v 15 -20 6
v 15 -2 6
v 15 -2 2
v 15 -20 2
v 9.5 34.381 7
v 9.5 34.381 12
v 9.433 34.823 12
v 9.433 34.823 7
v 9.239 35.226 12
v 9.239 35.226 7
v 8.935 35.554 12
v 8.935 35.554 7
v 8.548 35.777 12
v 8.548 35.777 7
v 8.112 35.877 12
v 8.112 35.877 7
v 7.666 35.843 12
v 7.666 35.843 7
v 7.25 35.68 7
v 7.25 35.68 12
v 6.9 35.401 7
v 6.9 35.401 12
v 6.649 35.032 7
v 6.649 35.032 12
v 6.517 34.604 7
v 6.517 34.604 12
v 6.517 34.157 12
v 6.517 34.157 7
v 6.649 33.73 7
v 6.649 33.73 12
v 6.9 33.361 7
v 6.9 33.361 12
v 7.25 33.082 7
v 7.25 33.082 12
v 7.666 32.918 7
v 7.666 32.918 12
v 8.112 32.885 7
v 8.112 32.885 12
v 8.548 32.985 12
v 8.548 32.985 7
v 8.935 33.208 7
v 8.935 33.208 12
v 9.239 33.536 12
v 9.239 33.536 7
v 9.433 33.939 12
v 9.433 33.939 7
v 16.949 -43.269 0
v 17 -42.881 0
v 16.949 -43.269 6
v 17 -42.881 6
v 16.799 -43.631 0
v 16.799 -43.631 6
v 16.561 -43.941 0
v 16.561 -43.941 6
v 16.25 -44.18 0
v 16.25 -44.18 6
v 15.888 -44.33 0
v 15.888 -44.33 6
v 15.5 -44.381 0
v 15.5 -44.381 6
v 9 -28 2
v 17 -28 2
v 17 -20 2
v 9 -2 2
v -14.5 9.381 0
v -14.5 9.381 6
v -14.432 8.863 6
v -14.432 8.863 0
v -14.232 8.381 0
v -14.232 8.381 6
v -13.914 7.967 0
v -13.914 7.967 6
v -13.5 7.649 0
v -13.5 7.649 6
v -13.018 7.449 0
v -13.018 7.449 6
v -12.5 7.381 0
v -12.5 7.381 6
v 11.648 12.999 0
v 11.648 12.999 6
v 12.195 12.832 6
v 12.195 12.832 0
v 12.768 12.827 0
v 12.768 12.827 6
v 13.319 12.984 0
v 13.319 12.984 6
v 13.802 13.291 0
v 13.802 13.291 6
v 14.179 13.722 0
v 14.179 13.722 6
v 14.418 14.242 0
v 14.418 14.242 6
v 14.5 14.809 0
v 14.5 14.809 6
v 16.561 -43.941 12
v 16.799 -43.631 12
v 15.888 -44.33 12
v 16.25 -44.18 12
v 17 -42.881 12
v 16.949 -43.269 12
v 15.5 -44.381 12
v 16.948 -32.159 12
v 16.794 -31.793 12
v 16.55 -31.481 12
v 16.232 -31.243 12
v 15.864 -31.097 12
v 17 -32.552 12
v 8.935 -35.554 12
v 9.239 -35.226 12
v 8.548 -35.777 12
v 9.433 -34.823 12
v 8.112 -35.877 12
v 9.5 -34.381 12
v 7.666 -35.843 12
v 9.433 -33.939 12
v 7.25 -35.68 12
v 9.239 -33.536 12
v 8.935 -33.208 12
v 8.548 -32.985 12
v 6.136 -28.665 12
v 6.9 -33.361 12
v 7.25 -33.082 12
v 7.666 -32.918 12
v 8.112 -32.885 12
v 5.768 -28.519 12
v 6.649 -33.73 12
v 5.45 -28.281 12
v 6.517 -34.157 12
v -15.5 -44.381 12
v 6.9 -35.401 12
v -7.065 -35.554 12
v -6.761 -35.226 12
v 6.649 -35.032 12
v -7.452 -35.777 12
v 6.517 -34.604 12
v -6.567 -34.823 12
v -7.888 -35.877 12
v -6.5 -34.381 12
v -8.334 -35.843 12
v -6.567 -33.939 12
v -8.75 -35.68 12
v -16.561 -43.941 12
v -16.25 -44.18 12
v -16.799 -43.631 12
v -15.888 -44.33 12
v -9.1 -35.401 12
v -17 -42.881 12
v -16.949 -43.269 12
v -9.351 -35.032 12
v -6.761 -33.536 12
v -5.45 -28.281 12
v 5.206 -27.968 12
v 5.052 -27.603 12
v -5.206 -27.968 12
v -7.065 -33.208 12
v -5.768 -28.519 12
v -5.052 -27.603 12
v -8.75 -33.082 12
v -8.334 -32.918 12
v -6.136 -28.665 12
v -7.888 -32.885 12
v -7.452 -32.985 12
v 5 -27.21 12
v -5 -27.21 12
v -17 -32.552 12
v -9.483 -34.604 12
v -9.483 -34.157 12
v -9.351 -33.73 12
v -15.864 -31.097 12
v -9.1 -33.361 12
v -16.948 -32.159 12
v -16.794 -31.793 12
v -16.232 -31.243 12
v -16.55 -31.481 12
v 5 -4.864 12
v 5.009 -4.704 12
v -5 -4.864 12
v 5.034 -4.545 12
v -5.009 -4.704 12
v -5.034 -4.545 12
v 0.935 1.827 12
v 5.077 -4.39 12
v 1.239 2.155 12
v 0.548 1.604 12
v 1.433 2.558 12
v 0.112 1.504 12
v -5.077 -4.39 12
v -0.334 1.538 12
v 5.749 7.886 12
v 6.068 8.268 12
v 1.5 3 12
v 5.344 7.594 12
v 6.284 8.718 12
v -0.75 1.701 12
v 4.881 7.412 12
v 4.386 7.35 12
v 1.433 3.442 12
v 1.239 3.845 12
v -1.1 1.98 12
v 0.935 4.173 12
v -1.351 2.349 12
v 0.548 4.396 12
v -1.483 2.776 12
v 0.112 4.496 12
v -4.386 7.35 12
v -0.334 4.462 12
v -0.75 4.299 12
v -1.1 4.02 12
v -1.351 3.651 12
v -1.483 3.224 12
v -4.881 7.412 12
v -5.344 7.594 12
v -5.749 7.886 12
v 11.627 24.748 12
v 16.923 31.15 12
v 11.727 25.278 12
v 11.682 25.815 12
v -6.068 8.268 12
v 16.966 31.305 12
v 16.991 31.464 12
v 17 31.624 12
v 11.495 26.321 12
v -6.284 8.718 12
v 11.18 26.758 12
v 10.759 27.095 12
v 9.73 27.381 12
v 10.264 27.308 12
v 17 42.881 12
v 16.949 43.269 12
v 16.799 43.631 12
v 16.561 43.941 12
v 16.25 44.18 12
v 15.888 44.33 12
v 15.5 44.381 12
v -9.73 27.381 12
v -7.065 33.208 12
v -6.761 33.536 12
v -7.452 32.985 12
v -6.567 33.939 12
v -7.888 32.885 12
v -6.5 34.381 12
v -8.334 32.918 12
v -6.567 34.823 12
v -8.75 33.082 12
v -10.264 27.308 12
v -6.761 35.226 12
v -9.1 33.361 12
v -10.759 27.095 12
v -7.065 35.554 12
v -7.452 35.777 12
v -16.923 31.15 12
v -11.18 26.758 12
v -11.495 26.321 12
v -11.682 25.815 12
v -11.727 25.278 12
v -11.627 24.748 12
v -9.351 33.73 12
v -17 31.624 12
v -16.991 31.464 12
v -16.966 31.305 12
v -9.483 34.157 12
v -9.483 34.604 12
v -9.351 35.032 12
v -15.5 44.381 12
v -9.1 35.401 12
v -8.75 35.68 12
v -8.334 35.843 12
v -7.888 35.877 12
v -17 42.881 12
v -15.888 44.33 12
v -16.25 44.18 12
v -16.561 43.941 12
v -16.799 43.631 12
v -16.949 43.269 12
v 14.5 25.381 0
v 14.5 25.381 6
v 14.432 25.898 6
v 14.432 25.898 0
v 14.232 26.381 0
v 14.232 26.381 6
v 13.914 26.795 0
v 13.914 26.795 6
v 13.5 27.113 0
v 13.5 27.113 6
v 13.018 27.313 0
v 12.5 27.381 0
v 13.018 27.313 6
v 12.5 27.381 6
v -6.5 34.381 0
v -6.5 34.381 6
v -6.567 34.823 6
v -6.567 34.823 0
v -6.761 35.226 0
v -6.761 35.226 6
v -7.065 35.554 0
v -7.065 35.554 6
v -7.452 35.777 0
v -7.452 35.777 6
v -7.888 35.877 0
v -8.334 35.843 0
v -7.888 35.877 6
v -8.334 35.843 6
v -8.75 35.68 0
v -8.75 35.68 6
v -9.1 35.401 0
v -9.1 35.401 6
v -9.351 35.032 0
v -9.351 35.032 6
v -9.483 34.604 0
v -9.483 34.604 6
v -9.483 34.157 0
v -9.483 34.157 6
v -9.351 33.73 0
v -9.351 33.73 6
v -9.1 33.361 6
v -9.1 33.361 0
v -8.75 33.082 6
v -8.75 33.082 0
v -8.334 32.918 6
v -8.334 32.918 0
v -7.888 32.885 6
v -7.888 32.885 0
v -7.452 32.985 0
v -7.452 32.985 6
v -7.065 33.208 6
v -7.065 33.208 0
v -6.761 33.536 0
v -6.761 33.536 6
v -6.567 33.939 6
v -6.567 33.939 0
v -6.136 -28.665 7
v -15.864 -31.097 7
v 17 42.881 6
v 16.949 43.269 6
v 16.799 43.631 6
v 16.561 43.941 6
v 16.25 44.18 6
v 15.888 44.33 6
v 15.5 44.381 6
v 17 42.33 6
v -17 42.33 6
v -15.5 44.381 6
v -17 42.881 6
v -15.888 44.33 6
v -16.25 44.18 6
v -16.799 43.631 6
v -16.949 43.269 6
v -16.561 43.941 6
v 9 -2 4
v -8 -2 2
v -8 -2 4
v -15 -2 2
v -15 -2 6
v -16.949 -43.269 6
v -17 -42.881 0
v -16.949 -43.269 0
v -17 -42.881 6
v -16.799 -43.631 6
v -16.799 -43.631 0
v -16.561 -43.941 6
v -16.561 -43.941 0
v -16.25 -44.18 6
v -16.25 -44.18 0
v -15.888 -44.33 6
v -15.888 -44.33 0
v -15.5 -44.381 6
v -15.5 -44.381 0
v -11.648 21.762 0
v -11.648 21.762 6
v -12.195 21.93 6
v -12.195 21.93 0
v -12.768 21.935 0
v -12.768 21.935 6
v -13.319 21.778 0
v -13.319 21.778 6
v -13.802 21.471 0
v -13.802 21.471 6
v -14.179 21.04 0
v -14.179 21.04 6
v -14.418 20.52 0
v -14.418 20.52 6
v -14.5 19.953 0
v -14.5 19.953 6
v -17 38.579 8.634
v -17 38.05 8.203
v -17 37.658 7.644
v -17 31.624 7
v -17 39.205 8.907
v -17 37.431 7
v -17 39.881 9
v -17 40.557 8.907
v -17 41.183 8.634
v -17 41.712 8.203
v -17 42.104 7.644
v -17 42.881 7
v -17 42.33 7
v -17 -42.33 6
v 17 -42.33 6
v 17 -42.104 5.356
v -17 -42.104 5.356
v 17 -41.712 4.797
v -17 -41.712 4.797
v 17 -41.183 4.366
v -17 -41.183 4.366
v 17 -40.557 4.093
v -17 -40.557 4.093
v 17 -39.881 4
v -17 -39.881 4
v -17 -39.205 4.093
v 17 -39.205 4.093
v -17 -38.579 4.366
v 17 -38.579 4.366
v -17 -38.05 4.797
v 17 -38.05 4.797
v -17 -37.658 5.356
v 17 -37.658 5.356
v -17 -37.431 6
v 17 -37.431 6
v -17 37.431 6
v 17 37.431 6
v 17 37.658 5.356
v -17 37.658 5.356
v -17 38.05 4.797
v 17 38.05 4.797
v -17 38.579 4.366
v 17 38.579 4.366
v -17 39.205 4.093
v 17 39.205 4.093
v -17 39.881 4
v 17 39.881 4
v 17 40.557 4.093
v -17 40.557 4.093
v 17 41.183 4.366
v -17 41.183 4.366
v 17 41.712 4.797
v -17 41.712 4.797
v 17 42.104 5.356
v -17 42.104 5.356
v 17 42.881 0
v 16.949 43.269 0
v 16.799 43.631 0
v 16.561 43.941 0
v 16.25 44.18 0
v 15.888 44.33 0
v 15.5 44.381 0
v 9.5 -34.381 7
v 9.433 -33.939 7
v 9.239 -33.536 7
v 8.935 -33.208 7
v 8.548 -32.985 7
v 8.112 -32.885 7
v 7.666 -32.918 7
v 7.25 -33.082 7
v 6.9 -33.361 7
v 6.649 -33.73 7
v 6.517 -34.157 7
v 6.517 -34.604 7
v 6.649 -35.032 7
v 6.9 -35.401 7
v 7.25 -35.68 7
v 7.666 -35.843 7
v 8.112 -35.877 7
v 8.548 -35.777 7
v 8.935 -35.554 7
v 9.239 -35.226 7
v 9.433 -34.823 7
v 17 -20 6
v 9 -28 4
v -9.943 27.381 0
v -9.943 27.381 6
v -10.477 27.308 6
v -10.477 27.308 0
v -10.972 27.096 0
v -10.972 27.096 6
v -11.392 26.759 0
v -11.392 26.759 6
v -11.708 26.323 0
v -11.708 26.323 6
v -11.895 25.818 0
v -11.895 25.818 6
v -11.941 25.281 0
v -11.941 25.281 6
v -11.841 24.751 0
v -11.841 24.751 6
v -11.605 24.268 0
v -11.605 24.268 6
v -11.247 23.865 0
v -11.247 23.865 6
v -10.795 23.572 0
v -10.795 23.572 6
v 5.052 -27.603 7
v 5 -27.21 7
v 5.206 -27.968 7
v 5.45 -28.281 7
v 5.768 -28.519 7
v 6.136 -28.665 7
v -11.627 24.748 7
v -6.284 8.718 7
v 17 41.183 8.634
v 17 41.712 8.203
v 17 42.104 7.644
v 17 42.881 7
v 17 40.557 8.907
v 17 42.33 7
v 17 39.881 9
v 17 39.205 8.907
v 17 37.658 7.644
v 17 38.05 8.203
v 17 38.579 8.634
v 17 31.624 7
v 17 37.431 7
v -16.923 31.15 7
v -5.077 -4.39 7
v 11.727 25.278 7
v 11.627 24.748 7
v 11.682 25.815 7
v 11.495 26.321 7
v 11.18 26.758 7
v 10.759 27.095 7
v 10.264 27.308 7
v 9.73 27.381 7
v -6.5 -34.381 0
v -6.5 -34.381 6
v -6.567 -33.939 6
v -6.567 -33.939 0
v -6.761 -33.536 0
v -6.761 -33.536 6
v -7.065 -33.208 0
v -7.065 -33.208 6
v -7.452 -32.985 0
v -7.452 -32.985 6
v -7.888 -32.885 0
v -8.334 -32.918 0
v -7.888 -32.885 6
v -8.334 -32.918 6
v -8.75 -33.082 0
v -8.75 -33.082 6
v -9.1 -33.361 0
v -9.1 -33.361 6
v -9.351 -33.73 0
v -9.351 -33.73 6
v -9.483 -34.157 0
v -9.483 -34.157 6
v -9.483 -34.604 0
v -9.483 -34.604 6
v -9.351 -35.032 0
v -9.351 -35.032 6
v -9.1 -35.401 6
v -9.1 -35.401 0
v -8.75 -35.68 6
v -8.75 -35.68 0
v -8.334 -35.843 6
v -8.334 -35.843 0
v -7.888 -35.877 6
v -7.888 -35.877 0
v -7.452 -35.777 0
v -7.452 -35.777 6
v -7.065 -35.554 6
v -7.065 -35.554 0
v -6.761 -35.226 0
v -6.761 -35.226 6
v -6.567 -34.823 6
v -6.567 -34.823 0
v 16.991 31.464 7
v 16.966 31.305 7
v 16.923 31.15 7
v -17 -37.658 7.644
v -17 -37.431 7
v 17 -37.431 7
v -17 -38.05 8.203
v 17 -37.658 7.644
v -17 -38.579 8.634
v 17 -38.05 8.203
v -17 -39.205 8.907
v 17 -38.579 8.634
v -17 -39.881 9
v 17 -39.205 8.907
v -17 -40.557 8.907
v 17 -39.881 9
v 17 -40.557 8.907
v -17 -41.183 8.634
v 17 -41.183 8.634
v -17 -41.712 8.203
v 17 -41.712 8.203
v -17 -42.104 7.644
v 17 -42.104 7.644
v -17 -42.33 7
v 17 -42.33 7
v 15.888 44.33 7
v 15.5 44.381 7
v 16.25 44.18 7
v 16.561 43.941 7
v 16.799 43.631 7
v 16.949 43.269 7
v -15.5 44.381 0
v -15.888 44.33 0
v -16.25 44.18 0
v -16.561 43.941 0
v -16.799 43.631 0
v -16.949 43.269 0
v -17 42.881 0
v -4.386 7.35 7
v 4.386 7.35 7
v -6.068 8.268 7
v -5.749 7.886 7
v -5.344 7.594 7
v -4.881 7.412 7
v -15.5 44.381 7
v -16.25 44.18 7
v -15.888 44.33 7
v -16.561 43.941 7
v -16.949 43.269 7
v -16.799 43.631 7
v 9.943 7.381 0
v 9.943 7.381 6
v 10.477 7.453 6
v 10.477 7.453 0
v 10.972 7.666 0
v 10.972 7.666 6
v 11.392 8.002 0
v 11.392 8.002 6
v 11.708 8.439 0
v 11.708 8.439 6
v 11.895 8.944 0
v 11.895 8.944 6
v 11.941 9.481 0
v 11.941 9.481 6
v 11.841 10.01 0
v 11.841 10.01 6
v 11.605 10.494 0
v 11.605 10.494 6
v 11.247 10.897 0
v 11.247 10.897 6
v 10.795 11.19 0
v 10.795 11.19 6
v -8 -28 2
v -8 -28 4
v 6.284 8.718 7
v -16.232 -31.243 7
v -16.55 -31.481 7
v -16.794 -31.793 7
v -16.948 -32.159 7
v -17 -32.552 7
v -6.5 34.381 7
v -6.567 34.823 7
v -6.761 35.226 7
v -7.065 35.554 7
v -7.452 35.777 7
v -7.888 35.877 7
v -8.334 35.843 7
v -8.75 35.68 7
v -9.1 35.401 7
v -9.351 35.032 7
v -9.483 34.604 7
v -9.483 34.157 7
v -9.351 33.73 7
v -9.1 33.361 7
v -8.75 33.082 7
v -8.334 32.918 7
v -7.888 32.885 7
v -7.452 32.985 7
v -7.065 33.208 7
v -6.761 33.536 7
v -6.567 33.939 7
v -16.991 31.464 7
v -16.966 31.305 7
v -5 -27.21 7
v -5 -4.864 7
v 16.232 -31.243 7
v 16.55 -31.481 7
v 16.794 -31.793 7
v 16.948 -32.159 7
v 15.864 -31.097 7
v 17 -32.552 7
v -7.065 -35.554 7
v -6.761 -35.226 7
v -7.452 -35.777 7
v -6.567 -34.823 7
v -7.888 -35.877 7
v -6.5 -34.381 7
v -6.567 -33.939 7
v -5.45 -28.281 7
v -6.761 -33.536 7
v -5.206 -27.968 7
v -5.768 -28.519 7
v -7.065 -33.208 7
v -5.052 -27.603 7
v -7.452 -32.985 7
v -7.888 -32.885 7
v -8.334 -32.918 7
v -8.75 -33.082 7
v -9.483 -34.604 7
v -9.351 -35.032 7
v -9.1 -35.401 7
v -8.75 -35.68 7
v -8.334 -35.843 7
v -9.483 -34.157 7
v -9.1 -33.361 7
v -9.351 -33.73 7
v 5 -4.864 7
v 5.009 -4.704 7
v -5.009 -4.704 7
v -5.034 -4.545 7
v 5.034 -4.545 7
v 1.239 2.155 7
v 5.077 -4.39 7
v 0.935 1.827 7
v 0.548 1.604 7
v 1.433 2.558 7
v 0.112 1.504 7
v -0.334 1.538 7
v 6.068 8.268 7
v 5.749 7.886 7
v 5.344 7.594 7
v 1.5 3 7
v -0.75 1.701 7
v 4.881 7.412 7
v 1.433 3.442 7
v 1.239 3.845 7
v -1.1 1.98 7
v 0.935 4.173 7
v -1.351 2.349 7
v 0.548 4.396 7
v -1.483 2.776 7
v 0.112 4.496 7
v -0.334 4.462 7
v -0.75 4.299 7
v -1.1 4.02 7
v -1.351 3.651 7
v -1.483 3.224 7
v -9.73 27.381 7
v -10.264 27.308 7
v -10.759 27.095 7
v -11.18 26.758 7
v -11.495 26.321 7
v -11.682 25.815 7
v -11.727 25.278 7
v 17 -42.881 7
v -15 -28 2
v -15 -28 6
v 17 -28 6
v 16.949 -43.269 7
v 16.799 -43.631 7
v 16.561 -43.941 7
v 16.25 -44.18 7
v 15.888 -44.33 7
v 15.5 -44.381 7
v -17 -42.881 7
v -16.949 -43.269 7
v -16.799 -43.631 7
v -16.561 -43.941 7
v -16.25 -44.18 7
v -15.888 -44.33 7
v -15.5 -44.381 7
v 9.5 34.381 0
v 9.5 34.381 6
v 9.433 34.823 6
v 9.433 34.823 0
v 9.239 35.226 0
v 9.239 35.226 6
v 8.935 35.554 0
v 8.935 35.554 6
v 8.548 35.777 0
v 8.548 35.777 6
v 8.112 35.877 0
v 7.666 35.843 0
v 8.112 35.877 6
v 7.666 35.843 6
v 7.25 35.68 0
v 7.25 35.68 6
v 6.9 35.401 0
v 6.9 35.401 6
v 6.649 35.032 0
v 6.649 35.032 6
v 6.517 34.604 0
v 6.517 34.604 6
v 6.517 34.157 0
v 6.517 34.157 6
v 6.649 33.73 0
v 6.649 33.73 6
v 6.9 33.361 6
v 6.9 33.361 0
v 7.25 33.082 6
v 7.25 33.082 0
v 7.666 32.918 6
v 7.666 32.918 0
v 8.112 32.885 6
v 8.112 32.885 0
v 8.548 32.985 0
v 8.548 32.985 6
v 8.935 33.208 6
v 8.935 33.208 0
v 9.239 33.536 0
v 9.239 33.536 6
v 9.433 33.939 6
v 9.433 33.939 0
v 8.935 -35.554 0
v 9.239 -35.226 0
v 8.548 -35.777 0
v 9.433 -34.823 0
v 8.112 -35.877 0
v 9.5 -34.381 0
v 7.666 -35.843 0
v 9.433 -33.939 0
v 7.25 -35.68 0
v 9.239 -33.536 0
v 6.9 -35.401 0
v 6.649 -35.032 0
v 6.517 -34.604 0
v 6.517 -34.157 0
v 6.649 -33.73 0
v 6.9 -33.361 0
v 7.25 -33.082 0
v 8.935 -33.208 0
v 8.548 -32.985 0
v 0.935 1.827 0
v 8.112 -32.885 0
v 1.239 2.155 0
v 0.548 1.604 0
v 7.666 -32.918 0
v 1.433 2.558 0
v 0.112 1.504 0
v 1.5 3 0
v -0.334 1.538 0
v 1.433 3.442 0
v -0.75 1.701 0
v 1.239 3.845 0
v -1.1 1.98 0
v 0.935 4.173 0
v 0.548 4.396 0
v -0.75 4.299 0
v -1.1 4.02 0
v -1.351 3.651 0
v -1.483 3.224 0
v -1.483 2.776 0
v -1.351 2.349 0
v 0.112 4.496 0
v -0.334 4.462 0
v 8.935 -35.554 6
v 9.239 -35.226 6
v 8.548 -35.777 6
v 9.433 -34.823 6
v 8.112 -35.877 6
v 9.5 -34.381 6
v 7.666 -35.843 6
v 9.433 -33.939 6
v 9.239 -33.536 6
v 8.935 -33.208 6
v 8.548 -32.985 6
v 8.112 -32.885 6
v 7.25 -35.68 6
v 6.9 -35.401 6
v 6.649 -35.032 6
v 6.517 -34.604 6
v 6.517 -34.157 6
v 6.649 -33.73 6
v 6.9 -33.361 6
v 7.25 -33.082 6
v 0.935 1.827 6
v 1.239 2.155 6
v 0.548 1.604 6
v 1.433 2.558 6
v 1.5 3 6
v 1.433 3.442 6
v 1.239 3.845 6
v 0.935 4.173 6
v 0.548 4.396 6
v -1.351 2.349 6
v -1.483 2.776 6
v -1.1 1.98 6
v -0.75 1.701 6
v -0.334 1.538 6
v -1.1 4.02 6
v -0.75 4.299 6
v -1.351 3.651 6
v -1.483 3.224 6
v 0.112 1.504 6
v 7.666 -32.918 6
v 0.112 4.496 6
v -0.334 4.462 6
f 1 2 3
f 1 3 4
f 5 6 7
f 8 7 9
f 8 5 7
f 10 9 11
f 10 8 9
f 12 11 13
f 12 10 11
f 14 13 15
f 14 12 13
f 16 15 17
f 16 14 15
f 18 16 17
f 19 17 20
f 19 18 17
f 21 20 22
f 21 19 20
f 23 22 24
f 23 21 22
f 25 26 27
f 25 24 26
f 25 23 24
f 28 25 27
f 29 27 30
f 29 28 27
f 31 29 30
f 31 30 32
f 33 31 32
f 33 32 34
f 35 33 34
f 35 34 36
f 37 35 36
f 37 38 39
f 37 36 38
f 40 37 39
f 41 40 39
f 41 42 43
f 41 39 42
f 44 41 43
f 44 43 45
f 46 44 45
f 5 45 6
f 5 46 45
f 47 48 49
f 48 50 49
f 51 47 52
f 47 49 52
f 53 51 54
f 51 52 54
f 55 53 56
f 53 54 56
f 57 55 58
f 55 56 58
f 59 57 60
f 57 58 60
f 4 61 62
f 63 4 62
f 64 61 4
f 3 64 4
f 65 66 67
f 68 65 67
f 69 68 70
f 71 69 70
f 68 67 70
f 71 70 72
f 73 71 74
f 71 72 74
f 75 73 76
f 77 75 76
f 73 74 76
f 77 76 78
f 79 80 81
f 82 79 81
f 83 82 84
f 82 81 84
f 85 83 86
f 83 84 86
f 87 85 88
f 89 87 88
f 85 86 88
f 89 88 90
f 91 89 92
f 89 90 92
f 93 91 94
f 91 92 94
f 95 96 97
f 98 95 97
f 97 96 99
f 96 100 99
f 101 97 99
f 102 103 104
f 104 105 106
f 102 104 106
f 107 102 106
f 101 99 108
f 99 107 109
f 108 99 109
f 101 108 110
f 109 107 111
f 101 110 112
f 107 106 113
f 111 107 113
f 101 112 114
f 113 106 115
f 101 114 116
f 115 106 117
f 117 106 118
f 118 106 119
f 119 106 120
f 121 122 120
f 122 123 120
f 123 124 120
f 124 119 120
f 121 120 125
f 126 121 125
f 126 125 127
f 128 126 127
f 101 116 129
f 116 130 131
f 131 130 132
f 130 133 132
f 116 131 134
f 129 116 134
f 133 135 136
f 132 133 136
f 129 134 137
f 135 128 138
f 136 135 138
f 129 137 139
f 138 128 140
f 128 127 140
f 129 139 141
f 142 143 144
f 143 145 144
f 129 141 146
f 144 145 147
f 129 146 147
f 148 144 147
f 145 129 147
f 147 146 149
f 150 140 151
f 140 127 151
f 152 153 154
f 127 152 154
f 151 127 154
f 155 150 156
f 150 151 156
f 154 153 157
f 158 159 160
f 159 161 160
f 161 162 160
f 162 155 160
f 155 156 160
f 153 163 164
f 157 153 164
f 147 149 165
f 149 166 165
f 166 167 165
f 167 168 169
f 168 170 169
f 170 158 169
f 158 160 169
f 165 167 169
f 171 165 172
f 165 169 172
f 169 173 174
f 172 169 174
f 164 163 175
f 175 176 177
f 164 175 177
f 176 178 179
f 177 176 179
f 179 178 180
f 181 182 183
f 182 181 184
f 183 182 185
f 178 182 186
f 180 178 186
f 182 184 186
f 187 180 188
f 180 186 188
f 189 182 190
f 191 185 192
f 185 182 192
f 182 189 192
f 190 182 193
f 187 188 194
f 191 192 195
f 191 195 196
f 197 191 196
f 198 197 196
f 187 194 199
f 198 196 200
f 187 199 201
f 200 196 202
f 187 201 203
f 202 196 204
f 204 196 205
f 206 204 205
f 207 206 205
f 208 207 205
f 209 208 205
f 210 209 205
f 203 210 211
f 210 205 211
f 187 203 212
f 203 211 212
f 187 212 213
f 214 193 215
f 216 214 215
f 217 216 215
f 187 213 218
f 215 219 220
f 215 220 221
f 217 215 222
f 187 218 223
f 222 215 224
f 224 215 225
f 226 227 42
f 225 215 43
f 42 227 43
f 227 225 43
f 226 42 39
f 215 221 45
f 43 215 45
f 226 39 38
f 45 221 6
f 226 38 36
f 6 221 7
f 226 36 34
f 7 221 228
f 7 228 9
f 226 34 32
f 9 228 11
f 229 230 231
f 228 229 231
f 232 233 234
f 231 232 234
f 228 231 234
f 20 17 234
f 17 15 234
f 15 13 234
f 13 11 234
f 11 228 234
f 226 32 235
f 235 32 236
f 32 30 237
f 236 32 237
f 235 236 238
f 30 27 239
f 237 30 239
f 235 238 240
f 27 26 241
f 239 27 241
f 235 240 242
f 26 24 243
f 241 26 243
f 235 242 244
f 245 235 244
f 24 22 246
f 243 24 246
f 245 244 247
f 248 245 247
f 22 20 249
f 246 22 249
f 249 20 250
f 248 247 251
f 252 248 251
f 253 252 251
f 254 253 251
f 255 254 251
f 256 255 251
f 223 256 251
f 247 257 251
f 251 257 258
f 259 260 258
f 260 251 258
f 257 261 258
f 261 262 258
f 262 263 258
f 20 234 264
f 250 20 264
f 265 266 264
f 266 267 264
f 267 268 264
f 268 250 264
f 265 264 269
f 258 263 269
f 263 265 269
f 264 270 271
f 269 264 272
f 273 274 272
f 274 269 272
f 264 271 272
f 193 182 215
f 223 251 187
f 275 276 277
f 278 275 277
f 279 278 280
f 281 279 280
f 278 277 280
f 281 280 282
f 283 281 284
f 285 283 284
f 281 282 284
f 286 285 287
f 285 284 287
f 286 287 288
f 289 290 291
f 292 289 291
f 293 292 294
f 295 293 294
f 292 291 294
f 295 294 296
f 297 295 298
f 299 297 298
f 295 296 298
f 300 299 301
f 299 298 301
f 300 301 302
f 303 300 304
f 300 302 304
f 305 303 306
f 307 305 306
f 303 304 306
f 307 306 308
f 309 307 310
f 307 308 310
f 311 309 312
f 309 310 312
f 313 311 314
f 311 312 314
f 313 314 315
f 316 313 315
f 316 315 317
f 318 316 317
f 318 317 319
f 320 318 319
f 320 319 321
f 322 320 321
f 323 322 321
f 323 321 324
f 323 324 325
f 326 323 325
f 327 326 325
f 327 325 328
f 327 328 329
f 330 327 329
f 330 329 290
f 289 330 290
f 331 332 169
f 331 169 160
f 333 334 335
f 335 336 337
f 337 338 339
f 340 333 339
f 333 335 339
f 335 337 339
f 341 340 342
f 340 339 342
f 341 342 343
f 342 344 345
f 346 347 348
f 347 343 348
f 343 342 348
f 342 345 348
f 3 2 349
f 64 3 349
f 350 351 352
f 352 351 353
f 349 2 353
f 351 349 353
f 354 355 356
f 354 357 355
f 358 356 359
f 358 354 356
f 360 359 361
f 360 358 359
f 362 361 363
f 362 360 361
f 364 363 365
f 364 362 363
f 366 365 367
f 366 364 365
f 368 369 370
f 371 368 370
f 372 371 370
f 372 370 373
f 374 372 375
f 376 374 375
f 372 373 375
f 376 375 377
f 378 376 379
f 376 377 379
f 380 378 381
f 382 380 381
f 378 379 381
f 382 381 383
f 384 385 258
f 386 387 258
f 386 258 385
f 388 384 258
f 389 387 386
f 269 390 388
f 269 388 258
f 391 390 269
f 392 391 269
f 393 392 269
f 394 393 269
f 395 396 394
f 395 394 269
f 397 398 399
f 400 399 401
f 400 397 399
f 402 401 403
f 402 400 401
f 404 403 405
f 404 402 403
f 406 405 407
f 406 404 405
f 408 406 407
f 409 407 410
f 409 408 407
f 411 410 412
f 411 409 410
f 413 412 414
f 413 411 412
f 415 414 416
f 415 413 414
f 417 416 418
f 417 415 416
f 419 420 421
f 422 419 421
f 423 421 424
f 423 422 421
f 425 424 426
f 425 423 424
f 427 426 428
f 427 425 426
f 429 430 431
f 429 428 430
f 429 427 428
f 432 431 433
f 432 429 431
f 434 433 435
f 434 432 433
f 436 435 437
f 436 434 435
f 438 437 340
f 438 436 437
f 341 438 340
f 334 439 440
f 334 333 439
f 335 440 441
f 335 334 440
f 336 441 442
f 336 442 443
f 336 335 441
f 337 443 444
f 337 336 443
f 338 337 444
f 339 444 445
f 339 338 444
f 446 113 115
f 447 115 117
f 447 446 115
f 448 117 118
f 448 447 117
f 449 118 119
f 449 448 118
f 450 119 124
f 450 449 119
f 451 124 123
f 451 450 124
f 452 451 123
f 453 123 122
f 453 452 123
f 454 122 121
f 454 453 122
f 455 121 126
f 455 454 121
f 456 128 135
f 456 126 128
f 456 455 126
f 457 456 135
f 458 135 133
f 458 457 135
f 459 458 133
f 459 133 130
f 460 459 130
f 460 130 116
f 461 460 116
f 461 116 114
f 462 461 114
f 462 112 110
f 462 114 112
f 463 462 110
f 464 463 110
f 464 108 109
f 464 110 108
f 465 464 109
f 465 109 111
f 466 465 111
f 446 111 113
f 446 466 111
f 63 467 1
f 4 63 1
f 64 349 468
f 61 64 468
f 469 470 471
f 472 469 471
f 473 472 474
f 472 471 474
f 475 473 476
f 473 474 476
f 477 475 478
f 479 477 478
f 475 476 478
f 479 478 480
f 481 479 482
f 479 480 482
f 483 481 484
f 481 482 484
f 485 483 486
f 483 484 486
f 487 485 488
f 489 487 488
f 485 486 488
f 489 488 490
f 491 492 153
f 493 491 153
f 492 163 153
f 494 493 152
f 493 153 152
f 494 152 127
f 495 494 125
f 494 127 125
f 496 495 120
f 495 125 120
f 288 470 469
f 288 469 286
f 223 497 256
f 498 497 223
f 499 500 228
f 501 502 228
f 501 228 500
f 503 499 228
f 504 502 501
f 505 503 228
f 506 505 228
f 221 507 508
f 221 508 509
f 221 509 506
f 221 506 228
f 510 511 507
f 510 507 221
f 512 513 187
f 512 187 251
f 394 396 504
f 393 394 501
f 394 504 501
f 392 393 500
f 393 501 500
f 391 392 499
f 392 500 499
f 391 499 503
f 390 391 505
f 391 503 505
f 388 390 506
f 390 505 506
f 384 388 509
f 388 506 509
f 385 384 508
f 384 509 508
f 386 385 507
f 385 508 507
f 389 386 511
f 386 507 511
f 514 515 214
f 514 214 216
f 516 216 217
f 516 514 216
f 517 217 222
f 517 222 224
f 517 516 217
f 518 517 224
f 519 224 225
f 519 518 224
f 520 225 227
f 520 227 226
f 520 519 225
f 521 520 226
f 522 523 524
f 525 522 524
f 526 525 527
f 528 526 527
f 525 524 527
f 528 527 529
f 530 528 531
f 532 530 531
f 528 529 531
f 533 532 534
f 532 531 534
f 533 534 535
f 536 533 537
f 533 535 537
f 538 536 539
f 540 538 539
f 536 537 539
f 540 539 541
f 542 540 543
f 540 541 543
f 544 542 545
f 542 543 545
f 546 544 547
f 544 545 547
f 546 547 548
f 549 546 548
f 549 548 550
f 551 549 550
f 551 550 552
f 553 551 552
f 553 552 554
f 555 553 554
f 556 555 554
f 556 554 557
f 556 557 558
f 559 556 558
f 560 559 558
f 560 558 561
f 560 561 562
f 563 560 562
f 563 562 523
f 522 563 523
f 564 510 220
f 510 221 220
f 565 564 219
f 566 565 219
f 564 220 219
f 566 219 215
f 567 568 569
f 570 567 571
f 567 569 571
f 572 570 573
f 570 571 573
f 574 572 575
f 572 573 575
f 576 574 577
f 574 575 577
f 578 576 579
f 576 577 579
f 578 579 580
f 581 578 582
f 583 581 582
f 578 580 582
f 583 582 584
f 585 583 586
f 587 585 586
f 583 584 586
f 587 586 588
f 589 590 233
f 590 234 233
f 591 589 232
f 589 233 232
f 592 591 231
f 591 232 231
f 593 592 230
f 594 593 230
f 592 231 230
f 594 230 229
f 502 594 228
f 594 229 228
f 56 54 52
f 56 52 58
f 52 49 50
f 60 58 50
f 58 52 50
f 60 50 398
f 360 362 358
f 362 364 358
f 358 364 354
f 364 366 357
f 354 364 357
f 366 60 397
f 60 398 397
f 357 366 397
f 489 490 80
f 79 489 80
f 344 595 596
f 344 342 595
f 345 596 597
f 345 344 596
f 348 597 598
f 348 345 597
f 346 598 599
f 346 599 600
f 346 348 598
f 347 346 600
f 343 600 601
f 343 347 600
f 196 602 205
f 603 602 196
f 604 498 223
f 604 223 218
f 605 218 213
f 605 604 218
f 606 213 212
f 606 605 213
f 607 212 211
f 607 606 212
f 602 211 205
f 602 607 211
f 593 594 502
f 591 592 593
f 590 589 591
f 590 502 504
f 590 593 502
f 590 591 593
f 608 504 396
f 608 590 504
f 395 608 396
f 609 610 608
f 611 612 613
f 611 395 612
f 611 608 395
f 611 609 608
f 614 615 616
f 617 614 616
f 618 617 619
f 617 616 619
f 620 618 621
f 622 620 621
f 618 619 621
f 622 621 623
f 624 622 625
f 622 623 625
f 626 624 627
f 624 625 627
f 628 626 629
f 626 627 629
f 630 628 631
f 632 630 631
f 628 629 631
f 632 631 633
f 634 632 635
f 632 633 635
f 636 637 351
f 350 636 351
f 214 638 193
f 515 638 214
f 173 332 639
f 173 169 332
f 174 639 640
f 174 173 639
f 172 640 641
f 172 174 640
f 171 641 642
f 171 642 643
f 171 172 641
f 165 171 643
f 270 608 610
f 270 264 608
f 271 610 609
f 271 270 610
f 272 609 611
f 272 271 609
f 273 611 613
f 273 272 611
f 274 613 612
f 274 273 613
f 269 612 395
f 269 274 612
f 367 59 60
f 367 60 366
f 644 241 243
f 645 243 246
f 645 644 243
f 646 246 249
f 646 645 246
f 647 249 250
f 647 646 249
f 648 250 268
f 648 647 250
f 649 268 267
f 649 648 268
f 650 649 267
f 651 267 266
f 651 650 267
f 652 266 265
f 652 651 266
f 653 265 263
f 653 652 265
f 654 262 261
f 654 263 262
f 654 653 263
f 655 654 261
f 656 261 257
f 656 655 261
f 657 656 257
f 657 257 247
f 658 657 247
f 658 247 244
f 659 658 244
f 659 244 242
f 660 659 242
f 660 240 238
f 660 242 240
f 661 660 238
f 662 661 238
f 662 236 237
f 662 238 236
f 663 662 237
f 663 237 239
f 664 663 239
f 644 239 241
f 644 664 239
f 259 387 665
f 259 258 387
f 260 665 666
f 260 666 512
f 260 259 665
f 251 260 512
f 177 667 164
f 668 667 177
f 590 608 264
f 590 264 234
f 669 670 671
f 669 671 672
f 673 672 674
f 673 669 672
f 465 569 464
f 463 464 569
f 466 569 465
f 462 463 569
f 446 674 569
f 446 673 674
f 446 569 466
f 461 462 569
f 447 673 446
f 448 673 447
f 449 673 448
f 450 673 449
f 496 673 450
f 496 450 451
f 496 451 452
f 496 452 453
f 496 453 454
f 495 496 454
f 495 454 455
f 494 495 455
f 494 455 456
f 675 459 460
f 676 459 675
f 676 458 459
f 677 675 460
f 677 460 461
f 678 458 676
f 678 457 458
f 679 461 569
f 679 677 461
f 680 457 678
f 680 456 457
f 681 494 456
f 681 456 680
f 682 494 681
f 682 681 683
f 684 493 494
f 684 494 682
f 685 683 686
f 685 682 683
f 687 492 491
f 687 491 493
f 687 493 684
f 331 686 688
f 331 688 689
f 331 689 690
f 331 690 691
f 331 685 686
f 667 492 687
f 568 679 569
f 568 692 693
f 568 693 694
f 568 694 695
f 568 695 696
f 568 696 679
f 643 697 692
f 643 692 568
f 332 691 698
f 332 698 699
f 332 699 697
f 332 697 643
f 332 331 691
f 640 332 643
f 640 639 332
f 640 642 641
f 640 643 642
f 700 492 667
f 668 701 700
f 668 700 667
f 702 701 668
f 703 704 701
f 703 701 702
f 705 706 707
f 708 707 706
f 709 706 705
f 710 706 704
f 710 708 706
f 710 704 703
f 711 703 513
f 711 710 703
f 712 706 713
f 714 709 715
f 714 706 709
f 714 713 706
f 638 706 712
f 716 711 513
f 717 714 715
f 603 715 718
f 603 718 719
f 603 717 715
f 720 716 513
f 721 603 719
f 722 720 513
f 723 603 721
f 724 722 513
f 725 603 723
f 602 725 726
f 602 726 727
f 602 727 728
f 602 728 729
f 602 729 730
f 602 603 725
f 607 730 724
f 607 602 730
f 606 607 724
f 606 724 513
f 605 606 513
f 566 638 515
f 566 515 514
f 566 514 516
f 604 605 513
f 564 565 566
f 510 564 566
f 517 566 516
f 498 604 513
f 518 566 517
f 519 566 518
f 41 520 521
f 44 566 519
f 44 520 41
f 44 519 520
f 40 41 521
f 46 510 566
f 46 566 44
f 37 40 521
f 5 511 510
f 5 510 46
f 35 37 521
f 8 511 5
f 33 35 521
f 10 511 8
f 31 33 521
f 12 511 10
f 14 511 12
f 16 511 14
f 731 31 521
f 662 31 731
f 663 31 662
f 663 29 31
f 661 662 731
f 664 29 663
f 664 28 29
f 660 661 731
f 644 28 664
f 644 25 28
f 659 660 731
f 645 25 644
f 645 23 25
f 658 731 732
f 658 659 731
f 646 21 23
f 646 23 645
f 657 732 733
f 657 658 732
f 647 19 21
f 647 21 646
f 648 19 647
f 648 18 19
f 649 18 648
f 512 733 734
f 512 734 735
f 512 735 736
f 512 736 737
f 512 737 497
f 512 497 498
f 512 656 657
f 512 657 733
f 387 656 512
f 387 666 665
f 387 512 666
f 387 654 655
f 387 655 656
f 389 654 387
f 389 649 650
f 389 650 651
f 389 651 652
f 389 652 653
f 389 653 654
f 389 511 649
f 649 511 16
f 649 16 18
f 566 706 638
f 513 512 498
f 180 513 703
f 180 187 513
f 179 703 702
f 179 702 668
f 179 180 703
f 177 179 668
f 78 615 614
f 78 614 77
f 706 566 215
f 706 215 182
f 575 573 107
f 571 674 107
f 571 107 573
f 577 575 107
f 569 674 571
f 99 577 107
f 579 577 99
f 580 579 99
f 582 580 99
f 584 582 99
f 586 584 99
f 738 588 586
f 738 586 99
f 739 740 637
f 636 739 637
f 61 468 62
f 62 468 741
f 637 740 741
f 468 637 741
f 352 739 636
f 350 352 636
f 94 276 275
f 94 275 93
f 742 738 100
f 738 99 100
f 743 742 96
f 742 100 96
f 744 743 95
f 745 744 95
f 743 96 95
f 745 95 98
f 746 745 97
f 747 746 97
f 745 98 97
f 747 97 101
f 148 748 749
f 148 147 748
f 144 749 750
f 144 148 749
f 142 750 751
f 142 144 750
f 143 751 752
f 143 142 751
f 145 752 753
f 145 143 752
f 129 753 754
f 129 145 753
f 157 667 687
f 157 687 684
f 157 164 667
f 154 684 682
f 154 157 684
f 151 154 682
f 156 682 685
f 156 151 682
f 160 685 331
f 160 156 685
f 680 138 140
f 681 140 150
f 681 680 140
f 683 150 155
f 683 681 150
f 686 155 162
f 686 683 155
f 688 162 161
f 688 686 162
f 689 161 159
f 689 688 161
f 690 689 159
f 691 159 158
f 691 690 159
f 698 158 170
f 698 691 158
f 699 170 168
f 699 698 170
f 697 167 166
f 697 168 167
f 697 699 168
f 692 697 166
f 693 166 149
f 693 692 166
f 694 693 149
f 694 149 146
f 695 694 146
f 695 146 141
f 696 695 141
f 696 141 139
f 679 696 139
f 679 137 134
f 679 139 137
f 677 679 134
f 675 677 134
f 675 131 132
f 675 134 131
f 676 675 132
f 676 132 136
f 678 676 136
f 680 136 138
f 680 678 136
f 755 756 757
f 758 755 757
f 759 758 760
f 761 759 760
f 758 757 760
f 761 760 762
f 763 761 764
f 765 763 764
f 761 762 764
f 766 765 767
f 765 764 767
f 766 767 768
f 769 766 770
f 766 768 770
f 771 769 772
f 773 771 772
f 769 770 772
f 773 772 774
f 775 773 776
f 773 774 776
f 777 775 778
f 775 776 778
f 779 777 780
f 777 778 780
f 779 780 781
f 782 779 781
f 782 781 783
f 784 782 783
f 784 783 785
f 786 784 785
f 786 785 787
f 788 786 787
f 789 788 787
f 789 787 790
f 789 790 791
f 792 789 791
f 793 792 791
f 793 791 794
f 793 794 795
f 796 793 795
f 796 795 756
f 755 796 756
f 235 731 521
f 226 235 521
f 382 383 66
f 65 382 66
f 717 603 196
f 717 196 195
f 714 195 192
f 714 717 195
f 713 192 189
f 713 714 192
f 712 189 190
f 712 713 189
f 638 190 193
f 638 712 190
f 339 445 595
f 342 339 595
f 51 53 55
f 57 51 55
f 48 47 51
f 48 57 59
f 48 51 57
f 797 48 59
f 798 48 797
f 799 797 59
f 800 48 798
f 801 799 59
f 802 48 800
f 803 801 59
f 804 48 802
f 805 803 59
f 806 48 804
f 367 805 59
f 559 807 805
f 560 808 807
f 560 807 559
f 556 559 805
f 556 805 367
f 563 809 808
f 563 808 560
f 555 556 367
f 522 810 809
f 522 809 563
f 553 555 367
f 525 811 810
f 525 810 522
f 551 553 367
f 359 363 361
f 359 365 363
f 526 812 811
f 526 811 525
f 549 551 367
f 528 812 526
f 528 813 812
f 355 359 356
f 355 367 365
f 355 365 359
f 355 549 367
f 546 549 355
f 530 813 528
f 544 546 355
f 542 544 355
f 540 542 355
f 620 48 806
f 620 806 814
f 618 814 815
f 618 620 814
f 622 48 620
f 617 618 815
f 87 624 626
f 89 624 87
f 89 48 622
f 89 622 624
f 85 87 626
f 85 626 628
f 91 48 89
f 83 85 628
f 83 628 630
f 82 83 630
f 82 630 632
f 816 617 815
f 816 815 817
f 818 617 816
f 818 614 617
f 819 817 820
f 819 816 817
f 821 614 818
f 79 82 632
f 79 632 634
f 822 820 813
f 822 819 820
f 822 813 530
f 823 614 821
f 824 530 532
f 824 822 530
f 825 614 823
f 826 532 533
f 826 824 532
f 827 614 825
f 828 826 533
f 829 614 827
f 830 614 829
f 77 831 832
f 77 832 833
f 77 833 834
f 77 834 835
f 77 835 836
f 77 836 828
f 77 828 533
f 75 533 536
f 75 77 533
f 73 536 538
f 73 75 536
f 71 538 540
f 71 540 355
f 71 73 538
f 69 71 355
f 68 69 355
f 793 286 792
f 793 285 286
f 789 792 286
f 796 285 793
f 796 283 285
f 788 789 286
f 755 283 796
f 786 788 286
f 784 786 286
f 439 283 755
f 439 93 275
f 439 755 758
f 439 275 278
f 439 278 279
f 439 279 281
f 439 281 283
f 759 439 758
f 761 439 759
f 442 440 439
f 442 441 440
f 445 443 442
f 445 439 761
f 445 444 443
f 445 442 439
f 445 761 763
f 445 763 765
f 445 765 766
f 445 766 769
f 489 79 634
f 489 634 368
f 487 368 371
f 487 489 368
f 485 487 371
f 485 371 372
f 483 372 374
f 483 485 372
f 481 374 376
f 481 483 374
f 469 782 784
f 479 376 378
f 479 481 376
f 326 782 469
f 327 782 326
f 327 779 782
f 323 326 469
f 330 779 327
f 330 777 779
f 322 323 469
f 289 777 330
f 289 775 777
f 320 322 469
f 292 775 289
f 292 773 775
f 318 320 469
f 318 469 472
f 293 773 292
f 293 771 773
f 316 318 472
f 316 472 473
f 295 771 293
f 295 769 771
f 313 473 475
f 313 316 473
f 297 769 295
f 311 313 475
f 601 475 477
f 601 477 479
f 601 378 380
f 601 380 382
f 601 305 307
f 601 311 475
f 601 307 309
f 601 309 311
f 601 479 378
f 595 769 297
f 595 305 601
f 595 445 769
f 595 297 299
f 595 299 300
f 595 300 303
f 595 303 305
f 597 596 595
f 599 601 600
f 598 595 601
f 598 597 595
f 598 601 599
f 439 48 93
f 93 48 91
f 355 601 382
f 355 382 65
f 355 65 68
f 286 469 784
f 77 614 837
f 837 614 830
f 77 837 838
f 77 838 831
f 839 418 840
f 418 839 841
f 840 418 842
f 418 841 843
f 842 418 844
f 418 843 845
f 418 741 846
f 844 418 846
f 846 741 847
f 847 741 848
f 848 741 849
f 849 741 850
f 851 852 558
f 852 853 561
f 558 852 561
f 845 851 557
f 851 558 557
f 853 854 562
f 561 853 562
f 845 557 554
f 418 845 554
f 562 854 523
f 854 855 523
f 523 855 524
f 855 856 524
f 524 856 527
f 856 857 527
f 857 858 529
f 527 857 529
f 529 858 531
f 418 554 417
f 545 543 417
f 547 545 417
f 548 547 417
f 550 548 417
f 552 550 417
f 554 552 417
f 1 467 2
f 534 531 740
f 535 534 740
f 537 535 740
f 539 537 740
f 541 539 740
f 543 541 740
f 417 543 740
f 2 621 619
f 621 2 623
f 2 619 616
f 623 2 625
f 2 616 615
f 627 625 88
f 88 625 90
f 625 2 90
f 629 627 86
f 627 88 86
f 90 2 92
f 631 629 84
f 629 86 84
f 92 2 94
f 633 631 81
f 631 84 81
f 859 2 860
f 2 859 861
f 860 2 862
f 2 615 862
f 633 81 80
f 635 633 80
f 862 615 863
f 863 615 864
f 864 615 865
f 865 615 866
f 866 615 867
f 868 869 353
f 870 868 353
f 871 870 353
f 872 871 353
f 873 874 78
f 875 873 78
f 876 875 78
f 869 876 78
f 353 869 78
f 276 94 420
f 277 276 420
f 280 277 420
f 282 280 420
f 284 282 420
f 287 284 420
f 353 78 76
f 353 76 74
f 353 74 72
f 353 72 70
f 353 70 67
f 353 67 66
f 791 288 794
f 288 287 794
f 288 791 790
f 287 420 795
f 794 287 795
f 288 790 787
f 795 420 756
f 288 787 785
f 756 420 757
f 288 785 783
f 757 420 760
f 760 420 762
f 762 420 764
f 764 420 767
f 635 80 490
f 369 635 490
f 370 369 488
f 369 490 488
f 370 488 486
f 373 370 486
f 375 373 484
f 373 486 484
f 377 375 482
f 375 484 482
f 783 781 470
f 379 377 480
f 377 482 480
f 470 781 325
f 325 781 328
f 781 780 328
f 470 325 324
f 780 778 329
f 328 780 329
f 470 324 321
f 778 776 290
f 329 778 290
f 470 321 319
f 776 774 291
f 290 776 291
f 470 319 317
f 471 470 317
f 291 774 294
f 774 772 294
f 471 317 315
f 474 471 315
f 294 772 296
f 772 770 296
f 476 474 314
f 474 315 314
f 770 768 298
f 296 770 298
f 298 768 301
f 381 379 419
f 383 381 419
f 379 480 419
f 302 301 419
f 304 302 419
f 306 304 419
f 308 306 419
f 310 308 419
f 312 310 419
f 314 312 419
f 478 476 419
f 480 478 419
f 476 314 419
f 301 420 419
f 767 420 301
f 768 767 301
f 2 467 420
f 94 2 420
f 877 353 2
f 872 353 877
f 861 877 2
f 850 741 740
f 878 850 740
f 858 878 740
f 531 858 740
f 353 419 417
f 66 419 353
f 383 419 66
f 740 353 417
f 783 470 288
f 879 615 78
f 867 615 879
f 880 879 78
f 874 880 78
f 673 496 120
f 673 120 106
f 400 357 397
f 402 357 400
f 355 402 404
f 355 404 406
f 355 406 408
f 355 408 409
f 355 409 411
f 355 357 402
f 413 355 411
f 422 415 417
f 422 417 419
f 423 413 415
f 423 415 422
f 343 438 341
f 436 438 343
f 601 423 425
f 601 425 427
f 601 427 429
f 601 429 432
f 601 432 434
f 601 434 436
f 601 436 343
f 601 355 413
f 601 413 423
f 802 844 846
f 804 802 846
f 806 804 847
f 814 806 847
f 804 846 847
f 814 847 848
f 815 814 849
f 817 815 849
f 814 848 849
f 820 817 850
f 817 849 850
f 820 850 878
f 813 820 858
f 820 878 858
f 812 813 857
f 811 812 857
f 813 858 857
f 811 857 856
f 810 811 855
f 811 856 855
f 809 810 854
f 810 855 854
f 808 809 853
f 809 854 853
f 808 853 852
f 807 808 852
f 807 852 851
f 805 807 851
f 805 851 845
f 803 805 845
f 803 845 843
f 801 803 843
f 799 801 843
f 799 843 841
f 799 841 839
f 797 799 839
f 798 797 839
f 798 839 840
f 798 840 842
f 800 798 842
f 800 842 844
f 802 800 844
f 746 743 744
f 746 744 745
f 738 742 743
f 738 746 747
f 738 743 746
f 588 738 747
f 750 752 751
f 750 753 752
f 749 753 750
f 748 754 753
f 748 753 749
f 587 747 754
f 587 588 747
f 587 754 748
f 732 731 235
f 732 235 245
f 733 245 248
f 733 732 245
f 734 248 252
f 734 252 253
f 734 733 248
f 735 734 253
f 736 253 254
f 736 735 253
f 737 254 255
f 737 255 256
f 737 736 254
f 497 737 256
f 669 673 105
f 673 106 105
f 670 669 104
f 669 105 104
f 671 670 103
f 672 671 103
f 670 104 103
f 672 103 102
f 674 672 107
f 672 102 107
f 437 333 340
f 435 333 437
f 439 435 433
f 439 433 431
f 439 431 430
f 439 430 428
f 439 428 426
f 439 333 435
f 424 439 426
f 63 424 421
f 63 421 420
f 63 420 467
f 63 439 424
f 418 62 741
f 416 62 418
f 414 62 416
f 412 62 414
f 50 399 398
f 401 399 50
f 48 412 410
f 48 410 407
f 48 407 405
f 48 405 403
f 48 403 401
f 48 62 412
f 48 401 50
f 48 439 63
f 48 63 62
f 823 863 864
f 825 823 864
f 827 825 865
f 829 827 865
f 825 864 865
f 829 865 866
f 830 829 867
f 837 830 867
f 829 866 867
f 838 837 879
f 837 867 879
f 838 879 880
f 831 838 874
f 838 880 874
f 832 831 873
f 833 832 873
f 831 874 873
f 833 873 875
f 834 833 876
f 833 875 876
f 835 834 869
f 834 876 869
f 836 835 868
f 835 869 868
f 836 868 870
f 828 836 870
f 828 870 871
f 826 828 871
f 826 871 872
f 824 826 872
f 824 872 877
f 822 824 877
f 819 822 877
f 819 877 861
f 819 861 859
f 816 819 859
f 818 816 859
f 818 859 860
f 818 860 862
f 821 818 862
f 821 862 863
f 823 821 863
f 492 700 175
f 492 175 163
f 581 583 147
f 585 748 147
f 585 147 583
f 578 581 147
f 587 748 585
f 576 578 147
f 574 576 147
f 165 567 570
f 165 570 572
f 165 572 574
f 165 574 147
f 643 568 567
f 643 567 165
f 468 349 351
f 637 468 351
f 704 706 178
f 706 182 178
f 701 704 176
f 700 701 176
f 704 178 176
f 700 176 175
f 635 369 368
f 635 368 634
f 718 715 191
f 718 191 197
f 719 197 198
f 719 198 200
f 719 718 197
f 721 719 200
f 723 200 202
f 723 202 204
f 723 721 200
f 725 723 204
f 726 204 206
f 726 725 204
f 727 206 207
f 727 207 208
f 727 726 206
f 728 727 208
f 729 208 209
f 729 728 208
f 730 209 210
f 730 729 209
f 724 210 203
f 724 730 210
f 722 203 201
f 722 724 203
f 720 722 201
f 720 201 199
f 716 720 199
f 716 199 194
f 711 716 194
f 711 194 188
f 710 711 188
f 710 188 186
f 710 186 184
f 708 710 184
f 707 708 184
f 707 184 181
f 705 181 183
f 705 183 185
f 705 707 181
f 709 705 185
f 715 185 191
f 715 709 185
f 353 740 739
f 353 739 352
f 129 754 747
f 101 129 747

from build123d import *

# Parameters (mm, degrees)
PAD_DEPTH            = 6
POCKET_DEPTH         = 2
SKETCH002_W          = 7
SKETCH002_H          = 26
POCKET001_DEPTH      = 4
SKETCH003_R          = 1.5
POCKET002_DEPTH      = 6.001
SKETCH004_R          = 2.5
POCKET003_DEPTH      = 17.001
POCKET003_DEPTH_BACK = -17.001
FILLET_R             = 1.5
SKETCH005_R          = 1.5
POCKET004_DEPTH      = 6.001
SKETCH006_R          = 1.5
PAD001_DEPTH         = 5
SKETCH007_R          = 2.5
POCKET005_DEPTH      = 17.001
POCKET005_DEPTH_BACK = -17.001
SKETCH009_R          = 1.5
POCKET006_DEPTH      = 0.001
POCKET006_DEPTH_BACK = -5.001
FILLET001_R          = 1.5


with BuildPart() as body:
    # Sketch → Pad (new body)
    with BuildSketch(Plane.XY):
        Polygon((17, 44.380822), (17, -44.380822), (-17, -44.380822), (-17, 44.380822), (0, 44.380822), align=None)
    extrude(amount=PAD_DEPTH)

    # Sketch001 (on DatumPlane) → Pocket (cut)
    with BuildSketch(Plane.XY.offset(6)):
        Polygon((15, -2), (15, -28), (-15, -28), (-15, -2), (0, -2), align=None)
    extrude(amount=-POCKET_DEPTH, mode=Mode.SUBTRACT)

    # Sketch002 (on DatumPlane) → Pocket001 (cut)
    with BuildSketch(Plane.XY.offset(6)):
        with Locations((-11.5, -15)):
            Rectangle(SKETCH002_W, SKETCH002_H)
        Polygon((15, -2), (9, -2), (9, -28), (17, -28), (17, -20), (15, -20), align=None)
    extrude(amount=-POCKET001_DEPTH, mode=Mode.SUBTRACT)

    # Sketch003 (on DatumPlane) → Pocket002 (cut, through all)
    with BuildSketch(Plane.XY.offset(6)):
        with Locations((-8, 34.380822)):
            Circle(SKETCH003_R)
        with Locations((8, 34.380822)):
            Circle(SKETCH003_R)
        with Locations((-8, -34.380822)):
            Circle(SKETCH003_R)
        with Locations((8, -34.380822)):
            Circle(SKETCH003_R)
    extrude(amount=-POCKET002_DEPTH, mode=Mode.SUBTRACT)

    # Sketch004 (on DatumPlane) → Pocket003 (cut, two sides)
    with BuildSketch(Plane.YZ) as pocket003_sk:
        with Locations((-39.880822, 6.5)):
            Circle(SKETCH004_R)
        with Locations((39.880822, 6.5)):
            Circle(SKETCH004_R)
    extrude(amount=-POCKET003_DEPTH, mode=Mode.SUBTRACT)
    extrude(pocket003_sk.sketch, amount=-POCKET003_DEPTH_BACK, mode=Mode.SUBTRACT)

    # Fillet
    fillet_edges = [body.edges().sort_by_distance(p)[0] for p in [
        (17, -44.380822, 3),
        (-17, -44.380822, 3),
        (17, 44.380822, 3),
        (-17, 44.380822, 3),
    ]]
    fillet(fillet_edges, radius=FILLET_R)

    # Sketch005 (on DatumPlane) → Pocket004 (cut, through all)
    with BuildSketch(Plane.XY.offset(6)):
        with Locations((0, 3)):
            Circle(SKETCH005_R)
        with BuildLine():
            Line((-9.943117, 27.380822), (12.5, 27.380822))
            ThreePointArc((14.5, 25.380822), (13.914214, 26.795036), (12.5, 27.380822))
            Line((14.5, 25.380822), (14.5, 14.808746))
            ThreePointArc((11.647706, 12.999438), (13.57131, 13.119872), (14.5, 14.808746))
            Line((-10.795411, 23.571515), (11.647706, 12.999438))
            ThreePointArc((-9.943117, 27.380822), (-11.894862, 25.817506), (-10.795411, 23.571515))
        make_face()
        with BuildLine():
            Line((-11.647706, 21.762207), (10.795411, 11.19013))
            ThreePointArc((9.943117, 7.380822), (11.894862, 8.944139), (10.795411, 11.19013))
            Line((9.943117, 7.380822), (-12.5, 7.380822))
            ThreePointArc((-14.5, 9.380822), (-13.914214, 7.966609), (-12.5, 7.380822))
            Line((-14.5, 19.952899), (-14.5, 9.380822))
            ThreePointArc((-11.647706, 21.762207), (-13.57131, 21.641773), (-14.5, 19.952899))
        make_face()
    extrude(amount=-POCKET004_DEPTH, mode=Mode.SUBTRACT)


with BuildPart() as body001:
    # Sketch006 (on DatumPlane) → Pad001 (new body)
    with BuildSketch(Plane.XY.offset(7)):
        Polygon((-17, 44.380822), (17, 44.380822), (17, 31.380822), (5, -4.620822), (5, -28.380822), (17, -31.380822), (17, -44.380822), (0, -44.380822), (-17, -44.380822), (-17, -31.380822), (-5, -28.380822), (-5, -4.620822), (-17, 31.380822), align=None)
        with Locations((0, 3)):
            Circle(SKETCH006_R, mode=Mode.SUBTRACT)
        with BuildLine():
            Line((-9.729653, 27.380822), (9.729653, 27.380822))
            ThreePointArc((11.627028, 24.748393), (11.352129, 26.550254), (9.729653, 27.380822))
            Line((6.283665, 8.71757), (11.627028, 24.748393))
            ThreePointArc((4.386289, 7.35), (5.555721, 7.727524), (6.283665, 8.71757))
            Line((-4.386289, 7.35), (4.386289, 7.35))
            ThreePointArc((-6.283665, 8.71757), (-5.555721, 7.727524), (-4.386289, 7.35))
            Line((-11.627028, 24.748393), (-6.283665, 8.71757))
            ThreePointArc((-9.729653, 27.380822), (-11.352129, 26.550254), (-11.627028, 24.748393))
        make_face(mode=Mode.SUBTRACT)
    extrude(amount=PAD001_DEPTH)

    # Sketch007 (on DatumPlane) → Pocket005 (cut, two sides)
    with BuildSketch(Plane.YZ) as pocket005_sk:
        with Locations((-39.880822, 6.5)):
            Circle(SKETCH007_R)
        with Locations((39.880822, 6.5)):
            Circle(SKETCH007_R)
    extrude(amount=-POCKET005_DEPTH, mode=Mode.SUBTRACT)
    extrude(pocket005_sk.sketch, amount=-POCKET005_DEPTH_BACK, mode=Mode.SUBTRACT)

    # Sketch009 (on DatumPlane) → Pocket006 (cut, two sides)
    with BuildSketch(Plane.XY.offset(7)) as pocket006_sk:
        with Locations((-8, 34.380822)):
            Circle(SKETCH009_R)
        with Locations((8, 34.380822)):
            Circle(SKETCH009_R)
        with Locations((-8, -34.380822)):
            Circle(SKETCH009_R)
        with Locations((8, -34.380822)):
            Circle(SKETCH009_R)
    extrude(amount=-POCKET006_DEPTH, mode=Mode.SUBTRACT)
    extrude(pocket006_sk.sketch, amount=-POCKET006_DEPTH_BACK, mode=Mode.SUBTRACT)

    # Fillet001
    fillet001_edges = [body001.edges().sort_by_distance(p)[0] for p in [
        (5, -4.620822, 9.5),
        (5, -28.380822, 9.5),
        (17, -31.380822, 9.5),
        (17, 31.380822, 9.5),
        (17, -44.380822, 9.5),
        (17, 44.380822, 9.5),
        (-17, 44.380822, 9.5),
        (-17, 31.380822, 9.5),
        (-5, -4.620822, 9.5),
        (-5, -28.380822, 9.5),
        (-17, -31.380822, 9.5),
        (-17, -44.380822, 9.5),
    ]]
    fillet(fillet001_edges, radius=FILLET001_R)


solid = Compound([body.part, body001.part])
